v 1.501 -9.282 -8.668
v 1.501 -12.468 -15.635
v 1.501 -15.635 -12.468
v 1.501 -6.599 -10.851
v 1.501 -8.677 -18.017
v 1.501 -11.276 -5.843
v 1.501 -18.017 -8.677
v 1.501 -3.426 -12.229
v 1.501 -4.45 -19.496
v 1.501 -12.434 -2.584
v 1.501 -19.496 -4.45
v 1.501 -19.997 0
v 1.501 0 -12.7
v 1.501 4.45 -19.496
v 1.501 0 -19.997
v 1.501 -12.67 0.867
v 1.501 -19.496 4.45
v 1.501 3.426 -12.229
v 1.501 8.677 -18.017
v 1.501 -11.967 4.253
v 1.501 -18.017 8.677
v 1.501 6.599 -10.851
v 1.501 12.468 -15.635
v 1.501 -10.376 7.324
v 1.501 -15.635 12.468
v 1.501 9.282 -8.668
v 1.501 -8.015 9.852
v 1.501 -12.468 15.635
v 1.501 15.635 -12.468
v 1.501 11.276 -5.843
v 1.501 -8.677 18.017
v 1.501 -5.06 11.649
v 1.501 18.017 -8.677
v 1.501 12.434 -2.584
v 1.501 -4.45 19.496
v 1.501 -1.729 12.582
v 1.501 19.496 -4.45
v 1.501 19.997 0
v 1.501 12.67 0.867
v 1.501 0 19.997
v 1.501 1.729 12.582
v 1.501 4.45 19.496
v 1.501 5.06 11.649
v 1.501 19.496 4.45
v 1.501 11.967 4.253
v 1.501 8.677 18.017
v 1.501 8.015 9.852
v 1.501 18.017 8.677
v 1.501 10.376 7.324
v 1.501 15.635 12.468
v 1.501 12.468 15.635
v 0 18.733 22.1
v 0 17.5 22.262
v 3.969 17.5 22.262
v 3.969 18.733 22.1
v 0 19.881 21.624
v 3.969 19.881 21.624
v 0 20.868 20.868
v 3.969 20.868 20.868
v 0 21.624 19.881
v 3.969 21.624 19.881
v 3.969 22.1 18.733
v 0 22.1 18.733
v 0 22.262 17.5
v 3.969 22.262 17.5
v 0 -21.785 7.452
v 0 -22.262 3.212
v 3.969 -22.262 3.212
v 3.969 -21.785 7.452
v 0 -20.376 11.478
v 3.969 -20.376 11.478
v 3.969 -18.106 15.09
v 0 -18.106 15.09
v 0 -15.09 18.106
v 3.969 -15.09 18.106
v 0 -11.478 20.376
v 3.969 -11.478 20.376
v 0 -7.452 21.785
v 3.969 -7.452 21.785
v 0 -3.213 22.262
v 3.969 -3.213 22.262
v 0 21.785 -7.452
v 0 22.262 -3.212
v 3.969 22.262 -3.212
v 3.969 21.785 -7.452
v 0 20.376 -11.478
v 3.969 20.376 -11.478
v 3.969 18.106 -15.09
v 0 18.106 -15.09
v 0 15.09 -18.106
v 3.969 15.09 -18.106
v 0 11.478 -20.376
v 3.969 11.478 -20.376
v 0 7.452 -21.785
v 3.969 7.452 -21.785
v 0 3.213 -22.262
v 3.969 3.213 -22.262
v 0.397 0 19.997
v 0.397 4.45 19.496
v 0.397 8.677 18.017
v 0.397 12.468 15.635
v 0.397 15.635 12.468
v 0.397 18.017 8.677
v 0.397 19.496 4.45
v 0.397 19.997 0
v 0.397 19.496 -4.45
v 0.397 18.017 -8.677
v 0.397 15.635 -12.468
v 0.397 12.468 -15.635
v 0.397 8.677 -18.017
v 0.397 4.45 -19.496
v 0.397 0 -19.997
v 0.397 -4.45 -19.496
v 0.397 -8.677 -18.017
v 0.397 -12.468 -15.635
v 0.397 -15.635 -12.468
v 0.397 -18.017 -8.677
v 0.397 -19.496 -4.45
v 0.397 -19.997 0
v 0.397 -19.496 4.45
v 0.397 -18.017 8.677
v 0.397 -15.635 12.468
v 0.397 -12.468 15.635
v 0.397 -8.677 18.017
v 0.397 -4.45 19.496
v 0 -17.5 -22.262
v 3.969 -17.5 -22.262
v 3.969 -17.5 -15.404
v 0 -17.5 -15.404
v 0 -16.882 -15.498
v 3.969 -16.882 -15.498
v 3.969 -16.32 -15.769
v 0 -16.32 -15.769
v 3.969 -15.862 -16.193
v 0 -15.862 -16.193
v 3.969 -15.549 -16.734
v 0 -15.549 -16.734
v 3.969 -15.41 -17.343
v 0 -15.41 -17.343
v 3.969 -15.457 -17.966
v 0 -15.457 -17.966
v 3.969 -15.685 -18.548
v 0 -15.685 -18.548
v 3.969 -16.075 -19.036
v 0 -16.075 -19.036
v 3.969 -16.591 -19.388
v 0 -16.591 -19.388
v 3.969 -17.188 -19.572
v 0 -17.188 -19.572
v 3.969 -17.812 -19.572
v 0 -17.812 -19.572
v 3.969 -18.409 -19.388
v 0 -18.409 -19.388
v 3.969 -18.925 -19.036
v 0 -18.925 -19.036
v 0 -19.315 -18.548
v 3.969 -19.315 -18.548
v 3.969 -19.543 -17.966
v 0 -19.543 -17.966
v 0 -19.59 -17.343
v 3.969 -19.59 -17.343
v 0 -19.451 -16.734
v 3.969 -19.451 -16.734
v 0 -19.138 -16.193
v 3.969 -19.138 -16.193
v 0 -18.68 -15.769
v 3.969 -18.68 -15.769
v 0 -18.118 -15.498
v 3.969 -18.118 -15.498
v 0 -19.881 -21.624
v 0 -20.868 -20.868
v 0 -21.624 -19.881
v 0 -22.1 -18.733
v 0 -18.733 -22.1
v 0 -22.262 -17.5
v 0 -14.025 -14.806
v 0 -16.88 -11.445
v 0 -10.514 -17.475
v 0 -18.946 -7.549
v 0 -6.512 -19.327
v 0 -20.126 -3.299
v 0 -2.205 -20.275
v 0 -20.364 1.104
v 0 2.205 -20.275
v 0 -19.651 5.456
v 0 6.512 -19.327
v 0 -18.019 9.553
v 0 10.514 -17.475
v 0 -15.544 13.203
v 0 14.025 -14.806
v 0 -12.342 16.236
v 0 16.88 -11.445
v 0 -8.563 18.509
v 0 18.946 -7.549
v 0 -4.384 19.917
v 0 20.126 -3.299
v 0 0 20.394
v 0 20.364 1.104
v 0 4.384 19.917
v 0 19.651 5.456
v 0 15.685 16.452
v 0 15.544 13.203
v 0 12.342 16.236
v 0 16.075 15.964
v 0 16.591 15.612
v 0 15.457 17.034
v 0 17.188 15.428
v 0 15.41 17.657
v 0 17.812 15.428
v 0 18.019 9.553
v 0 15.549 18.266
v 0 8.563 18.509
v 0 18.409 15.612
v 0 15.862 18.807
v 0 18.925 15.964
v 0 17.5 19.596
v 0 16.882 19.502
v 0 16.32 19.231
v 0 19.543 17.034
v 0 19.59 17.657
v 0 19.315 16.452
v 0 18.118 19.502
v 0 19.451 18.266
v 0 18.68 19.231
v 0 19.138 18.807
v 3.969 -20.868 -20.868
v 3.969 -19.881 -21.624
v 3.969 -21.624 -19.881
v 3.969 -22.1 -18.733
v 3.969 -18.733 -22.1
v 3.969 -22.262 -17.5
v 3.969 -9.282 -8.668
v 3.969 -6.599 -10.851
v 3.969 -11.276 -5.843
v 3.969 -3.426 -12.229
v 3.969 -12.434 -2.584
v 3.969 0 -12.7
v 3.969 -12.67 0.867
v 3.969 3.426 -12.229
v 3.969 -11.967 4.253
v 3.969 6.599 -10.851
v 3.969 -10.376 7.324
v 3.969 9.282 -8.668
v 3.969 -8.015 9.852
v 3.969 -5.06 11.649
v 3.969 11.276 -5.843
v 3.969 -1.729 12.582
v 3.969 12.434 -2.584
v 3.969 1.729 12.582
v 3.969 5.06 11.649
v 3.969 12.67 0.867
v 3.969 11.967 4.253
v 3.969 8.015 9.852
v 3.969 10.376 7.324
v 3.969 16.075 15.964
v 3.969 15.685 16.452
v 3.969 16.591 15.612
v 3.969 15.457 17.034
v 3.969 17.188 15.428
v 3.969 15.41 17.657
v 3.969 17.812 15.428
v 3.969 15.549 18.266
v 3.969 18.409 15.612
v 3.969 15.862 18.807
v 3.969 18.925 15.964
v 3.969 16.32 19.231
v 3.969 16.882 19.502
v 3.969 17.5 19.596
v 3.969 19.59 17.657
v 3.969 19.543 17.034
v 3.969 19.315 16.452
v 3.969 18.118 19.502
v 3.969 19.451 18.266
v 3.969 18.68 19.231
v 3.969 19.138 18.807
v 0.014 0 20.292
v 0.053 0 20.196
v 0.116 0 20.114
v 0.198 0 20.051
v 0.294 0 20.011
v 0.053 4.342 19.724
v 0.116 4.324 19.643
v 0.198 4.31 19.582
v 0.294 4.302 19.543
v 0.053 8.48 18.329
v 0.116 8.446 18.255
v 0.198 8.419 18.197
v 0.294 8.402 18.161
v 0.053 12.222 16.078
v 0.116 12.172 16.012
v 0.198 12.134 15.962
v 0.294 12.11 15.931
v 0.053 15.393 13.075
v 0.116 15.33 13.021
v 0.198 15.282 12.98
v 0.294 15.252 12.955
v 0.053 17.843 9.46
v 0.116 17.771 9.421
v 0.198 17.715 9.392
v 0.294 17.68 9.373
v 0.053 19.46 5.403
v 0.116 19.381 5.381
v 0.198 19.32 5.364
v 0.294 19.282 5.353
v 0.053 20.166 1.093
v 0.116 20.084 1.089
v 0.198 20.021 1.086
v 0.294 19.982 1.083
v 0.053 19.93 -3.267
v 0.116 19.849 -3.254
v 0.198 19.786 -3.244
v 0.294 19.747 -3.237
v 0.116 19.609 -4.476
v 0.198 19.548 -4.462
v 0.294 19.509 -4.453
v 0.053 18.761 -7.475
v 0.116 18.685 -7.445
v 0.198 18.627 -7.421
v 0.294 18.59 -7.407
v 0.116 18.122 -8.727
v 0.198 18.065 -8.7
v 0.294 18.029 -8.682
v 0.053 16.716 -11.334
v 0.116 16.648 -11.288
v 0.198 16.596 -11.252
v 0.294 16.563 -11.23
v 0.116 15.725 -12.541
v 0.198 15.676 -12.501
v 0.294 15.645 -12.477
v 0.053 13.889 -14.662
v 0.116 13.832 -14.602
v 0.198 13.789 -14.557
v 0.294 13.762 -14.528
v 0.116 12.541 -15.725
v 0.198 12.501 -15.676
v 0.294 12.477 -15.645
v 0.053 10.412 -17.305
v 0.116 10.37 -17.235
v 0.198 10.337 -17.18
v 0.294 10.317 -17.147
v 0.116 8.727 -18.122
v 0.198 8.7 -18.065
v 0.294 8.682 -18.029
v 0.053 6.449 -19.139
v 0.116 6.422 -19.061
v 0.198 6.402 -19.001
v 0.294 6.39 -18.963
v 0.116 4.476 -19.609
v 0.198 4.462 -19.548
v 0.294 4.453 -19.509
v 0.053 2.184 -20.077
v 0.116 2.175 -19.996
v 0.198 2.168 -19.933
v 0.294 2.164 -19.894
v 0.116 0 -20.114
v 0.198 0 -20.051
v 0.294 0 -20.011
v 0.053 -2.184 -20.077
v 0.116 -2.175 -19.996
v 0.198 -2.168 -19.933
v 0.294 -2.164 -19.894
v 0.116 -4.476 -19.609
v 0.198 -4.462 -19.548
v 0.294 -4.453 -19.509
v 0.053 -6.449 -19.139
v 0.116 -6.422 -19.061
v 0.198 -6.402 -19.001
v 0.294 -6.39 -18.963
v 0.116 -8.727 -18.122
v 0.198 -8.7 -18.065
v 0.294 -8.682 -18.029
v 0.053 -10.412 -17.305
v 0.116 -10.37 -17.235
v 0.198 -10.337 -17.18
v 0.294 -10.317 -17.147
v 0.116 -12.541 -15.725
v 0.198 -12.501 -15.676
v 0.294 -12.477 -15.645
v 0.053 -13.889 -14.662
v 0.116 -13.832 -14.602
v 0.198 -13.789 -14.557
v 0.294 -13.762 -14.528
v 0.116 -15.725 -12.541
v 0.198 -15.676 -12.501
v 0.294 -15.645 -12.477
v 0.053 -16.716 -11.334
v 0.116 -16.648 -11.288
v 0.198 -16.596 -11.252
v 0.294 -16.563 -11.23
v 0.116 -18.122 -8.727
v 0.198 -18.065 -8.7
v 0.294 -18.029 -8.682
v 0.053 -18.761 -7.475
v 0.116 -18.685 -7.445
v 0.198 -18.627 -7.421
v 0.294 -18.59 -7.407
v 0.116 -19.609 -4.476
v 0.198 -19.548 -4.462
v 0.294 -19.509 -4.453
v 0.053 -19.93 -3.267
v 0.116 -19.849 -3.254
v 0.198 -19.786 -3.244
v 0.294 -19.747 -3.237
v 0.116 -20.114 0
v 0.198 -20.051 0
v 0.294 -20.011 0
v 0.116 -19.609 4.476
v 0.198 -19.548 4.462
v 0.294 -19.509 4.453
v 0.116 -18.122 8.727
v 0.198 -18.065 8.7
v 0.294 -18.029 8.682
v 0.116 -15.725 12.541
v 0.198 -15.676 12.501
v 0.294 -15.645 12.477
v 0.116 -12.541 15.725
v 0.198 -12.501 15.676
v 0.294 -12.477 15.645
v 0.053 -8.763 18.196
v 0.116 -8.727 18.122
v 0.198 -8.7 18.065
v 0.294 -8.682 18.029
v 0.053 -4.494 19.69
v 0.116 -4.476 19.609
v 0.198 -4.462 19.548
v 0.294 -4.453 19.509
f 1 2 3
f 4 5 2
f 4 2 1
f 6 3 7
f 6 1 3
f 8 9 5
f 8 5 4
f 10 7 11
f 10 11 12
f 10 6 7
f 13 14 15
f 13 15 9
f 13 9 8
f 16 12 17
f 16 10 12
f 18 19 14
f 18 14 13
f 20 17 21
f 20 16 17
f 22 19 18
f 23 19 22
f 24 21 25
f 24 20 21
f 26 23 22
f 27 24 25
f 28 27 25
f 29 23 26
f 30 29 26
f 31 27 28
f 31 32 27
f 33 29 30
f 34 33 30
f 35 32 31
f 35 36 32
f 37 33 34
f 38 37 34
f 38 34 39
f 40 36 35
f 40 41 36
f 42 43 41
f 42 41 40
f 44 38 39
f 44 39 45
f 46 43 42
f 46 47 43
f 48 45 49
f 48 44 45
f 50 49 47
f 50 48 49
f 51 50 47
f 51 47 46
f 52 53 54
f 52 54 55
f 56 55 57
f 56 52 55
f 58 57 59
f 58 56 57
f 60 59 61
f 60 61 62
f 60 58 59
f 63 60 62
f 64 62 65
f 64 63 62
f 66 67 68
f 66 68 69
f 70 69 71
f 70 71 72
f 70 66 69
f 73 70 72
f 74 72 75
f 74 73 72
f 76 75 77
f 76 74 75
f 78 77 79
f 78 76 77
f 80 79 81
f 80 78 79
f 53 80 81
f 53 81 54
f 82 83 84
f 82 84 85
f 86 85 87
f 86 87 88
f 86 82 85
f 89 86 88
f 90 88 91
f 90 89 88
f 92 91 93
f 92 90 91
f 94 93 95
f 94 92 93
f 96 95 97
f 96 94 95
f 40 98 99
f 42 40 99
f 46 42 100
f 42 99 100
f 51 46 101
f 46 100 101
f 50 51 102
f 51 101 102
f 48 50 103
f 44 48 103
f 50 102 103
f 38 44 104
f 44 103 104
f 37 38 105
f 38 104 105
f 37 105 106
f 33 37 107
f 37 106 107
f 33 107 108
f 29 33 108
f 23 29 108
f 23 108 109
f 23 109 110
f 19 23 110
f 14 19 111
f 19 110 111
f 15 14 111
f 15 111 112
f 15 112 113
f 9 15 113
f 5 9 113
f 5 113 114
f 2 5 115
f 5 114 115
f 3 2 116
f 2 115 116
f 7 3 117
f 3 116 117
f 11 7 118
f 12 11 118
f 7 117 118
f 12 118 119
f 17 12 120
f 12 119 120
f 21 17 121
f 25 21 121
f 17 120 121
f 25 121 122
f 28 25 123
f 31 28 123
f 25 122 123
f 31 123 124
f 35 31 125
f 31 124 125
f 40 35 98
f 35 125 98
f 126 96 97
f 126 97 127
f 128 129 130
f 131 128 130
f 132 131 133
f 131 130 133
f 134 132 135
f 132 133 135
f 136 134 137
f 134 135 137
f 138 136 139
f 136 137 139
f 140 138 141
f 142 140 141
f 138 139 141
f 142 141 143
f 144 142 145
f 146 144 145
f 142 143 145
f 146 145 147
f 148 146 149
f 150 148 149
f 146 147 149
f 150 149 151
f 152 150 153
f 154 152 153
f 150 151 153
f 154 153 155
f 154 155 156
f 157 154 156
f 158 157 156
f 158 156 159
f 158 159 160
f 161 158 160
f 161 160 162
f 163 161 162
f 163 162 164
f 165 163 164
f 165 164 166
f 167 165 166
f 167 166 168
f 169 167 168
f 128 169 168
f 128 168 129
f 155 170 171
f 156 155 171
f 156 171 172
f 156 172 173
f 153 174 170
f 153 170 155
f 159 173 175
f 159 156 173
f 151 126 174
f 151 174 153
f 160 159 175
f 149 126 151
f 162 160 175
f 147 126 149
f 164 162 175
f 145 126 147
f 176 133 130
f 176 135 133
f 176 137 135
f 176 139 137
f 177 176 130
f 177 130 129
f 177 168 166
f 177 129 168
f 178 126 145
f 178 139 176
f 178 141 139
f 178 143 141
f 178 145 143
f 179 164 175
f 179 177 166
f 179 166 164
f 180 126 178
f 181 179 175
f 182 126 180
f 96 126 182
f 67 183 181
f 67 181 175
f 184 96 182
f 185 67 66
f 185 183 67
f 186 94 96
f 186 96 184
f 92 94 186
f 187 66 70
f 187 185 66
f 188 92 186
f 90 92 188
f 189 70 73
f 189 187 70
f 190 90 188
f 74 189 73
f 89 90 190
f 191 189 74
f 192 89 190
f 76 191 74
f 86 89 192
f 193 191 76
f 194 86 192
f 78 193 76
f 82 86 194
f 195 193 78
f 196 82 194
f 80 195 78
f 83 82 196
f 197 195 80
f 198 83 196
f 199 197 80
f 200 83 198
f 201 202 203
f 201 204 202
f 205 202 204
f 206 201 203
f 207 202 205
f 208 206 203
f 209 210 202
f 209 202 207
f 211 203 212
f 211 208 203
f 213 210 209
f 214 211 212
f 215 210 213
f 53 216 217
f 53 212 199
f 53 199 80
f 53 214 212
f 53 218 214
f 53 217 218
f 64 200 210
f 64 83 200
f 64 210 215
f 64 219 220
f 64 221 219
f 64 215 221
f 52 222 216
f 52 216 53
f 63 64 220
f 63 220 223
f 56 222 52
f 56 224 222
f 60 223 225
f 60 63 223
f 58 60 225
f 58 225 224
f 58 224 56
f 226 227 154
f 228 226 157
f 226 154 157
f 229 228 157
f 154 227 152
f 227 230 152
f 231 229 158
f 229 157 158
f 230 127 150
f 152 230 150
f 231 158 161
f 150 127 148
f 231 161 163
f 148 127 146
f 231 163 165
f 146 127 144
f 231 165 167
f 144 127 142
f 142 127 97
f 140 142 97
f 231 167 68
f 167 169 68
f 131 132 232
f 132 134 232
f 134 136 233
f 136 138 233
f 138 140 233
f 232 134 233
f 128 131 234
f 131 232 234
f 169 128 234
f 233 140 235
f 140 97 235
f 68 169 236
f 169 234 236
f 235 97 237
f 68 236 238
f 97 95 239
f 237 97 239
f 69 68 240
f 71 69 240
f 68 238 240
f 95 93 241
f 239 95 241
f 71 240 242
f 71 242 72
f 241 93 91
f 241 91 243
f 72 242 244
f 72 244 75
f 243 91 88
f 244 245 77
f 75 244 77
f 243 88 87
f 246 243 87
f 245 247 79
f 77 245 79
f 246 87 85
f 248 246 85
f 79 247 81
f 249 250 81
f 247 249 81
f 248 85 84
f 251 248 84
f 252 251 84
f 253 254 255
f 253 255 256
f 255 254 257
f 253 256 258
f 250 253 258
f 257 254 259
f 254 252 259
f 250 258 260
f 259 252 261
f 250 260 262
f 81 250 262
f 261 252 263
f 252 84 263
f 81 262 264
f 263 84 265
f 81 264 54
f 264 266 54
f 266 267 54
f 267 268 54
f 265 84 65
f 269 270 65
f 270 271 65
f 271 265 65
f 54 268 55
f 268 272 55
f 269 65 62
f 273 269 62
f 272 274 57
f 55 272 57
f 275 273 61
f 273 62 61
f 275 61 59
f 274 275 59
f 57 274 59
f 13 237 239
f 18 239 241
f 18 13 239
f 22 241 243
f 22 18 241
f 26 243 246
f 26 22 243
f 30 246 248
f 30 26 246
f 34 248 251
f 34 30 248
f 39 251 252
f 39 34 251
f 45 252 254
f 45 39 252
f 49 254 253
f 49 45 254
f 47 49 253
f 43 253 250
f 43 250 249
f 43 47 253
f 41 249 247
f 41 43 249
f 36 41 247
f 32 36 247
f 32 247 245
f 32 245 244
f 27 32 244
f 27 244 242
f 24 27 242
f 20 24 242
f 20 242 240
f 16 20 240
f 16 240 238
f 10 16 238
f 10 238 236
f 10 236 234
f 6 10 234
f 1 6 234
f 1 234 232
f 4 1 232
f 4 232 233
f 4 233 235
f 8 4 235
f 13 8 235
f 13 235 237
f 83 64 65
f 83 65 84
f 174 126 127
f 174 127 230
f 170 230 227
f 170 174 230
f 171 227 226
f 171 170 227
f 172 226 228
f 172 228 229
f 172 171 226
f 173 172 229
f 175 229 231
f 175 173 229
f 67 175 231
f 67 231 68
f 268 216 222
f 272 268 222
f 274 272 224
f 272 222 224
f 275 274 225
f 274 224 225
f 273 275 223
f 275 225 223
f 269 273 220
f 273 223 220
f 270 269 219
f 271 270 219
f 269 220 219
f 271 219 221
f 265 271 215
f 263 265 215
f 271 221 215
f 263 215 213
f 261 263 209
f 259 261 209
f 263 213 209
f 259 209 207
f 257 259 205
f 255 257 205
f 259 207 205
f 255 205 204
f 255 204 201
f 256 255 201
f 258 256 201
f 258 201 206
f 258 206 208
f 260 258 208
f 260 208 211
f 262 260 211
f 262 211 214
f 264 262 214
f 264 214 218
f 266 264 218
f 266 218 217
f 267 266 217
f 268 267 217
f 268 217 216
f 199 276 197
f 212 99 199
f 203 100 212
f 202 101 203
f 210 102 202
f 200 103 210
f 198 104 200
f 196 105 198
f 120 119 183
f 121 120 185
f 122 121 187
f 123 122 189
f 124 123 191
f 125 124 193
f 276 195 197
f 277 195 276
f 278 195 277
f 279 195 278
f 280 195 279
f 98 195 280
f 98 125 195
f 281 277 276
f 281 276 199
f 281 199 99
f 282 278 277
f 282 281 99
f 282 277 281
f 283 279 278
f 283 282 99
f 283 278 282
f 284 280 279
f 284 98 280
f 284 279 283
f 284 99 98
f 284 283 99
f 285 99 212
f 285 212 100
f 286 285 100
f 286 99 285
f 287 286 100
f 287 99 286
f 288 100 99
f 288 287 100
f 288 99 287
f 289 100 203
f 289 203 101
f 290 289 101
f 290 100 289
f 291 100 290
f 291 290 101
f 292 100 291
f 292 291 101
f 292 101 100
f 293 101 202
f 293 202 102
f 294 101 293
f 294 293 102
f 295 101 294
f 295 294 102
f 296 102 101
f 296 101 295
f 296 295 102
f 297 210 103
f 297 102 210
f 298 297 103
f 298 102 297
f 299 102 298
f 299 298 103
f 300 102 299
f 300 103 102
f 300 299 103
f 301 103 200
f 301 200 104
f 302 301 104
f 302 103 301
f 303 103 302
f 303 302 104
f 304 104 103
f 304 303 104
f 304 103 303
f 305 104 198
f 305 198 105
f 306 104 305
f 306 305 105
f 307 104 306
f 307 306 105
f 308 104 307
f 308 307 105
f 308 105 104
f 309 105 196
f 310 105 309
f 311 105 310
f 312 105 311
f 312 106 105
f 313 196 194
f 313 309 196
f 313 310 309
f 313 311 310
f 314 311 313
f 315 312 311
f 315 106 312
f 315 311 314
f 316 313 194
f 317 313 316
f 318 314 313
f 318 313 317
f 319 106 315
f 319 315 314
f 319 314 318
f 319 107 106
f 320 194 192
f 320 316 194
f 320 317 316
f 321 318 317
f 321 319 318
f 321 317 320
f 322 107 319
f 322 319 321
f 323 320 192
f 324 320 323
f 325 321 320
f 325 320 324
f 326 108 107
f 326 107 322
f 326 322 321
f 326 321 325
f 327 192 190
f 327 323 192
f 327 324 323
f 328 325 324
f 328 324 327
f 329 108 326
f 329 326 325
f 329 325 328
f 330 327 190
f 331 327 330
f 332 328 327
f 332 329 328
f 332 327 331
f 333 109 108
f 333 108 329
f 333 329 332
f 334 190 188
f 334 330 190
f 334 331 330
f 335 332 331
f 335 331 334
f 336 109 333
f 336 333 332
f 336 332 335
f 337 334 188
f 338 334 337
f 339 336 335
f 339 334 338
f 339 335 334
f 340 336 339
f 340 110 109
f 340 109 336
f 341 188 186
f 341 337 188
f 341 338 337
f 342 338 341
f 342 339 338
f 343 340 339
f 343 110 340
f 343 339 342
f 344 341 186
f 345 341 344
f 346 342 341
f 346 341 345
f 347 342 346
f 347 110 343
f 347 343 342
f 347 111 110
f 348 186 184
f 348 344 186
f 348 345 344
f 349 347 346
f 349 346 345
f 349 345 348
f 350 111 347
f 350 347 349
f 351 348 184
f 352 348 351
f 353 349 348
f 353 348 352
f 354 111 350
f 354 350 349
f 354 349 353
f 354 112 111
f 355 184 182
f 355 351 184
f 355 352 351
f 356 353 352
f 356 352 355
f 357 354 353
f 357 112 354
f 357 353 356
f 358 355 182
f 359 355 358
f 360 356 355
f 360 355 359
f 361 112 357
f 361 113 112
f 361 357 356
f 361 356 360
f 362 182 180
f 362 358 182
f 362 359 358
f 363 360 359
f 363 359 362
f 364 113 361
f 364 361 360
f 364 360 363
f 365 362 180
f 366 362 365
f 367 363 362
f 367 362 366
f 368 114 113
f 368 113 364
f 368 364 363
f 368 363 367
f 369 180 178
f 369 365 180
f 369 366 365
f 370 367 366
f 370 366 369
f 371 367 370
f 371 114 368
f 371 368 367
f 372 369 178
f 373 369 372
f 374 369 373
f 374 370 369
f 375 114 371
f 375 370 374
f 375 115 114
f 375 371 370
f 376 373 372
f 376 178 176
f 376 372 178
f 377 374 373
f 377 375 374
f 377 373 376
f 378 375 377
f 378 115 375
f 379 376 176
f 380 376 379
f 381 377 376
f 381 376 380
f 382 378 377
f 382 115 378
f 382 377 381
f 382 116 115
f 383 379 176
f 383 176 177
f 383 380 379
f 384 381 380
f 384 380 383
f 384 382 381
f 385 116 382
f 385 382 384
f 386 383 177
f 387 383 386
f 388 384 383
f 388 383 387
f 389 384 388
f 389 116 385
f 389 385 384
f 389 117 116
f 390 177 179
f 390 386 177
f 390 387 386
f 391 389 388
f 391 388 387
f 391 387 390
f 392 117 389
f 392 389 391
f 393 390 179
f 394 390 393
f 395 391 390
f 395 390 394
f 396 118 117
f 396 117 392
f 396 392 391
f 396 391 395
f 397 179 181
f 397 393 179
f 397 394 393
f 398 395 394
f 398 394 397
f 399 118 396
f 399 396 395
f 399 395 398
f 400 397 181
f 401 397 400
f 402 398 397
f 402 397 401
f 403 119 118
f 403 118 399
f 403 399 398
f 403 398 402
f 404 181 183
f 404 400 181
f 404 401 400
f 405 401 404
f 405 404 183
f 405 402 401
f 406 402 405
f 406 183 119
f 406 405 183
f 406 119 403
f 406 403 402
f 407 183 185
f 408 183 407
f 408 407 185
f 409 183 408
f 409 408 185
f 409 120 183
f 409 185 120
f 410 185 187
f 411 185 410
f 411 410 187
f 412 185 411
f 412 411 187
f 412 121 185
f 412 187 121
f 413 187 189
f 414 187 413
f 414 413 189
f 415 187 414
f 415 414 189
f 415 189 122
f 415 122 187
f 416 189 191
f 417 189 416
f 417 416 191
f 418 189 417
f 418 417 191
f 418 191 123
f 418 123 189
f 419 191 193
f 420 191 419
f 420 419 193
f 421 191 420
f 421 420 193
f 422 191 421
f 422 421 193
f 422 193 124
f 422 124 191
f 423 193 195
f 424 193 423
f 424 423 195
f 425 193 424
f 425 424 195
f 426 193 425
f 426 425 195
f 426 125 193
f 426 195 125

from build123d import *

# Parameters (mm, degrees)
SKETCH1_R             = 12.7
BOSS_EXTRUDE1_DEPTH   = 3.96875
SKETCH2_R             = 19.99742
CUT_EXTRUDE1_DEPTH    = 1.50114
F_8_CLEARANCE_HOLE1_D = 4.191
FILLET1_R             = 0.396875


with BuildPart() as part:
    # Sketch1 → Boss-Extrude1 (new body)
    with BuildSketch(Plane(origin=(0, 0, 0), x_dir=(0, 0, -1), z_dir=(1, 0, 0))):
        with BuildLine():
            Line((-17.5, 22.2625), (3.2125, 22.2625))
            ThreePointArc((3.2125, 22.2625), (16.682884182, 16.682884182), (22.2625, 3.2125))
            Line((22.2625, 3.2125), (22.2625, -17.5))
            ThreePointArc((22.2625, -17.5), (20.867596045, -20.867596045), (17.5, -22.2625))
            Line((17.5, -22.2625), (-3.2125, -22.2625))
            ThreePointArc((-3.2125, -22.2625), (-16.682884182, -16.682884182), (-22.2625, -3.2125))
            Line((-22.2625, -3.2125), (-22.2625, 17.5))
            ThreePointArc((-22.2625, 17.5), (-20.867596045, 20.867596045), (-17.5, 22.2625))
        make_face()
        Circle(SKETCH1_R, mode=Mode.SUBTRACT)
    extrude(amount=BOSS_EXTRUDE1_DEPTH)

    # Sketch2 → Cut-Extrude1 (cut)
    with BuildSketch(Plane.ZY):
        Circle(SKETCH2_R)
    extrude(amount=-CUT_EXTRUDE1_DEPTH, mode=Mode.SUBTRACT)

    # #8 Clearance Hole1 (through all)
    with Locations(Plane(origin=(3.96875, 0, 0), x_dir=(0, 0, -1), z_dir=(1, 0, 0))):
        with Locations((-17.5, 17.5), (17.5, -17.5)):
            Hole(F_8_CLEARANCE_HOLE1_D / 2)

    # Fillet1
    fillet1_edges = [part.edges().sort_by_distance(p)[0] for p in [
        (0, 0, -19.99742),
    ]]
    fillet(fillet1_edges, radius=FILLET1_R)


solid = part.part
